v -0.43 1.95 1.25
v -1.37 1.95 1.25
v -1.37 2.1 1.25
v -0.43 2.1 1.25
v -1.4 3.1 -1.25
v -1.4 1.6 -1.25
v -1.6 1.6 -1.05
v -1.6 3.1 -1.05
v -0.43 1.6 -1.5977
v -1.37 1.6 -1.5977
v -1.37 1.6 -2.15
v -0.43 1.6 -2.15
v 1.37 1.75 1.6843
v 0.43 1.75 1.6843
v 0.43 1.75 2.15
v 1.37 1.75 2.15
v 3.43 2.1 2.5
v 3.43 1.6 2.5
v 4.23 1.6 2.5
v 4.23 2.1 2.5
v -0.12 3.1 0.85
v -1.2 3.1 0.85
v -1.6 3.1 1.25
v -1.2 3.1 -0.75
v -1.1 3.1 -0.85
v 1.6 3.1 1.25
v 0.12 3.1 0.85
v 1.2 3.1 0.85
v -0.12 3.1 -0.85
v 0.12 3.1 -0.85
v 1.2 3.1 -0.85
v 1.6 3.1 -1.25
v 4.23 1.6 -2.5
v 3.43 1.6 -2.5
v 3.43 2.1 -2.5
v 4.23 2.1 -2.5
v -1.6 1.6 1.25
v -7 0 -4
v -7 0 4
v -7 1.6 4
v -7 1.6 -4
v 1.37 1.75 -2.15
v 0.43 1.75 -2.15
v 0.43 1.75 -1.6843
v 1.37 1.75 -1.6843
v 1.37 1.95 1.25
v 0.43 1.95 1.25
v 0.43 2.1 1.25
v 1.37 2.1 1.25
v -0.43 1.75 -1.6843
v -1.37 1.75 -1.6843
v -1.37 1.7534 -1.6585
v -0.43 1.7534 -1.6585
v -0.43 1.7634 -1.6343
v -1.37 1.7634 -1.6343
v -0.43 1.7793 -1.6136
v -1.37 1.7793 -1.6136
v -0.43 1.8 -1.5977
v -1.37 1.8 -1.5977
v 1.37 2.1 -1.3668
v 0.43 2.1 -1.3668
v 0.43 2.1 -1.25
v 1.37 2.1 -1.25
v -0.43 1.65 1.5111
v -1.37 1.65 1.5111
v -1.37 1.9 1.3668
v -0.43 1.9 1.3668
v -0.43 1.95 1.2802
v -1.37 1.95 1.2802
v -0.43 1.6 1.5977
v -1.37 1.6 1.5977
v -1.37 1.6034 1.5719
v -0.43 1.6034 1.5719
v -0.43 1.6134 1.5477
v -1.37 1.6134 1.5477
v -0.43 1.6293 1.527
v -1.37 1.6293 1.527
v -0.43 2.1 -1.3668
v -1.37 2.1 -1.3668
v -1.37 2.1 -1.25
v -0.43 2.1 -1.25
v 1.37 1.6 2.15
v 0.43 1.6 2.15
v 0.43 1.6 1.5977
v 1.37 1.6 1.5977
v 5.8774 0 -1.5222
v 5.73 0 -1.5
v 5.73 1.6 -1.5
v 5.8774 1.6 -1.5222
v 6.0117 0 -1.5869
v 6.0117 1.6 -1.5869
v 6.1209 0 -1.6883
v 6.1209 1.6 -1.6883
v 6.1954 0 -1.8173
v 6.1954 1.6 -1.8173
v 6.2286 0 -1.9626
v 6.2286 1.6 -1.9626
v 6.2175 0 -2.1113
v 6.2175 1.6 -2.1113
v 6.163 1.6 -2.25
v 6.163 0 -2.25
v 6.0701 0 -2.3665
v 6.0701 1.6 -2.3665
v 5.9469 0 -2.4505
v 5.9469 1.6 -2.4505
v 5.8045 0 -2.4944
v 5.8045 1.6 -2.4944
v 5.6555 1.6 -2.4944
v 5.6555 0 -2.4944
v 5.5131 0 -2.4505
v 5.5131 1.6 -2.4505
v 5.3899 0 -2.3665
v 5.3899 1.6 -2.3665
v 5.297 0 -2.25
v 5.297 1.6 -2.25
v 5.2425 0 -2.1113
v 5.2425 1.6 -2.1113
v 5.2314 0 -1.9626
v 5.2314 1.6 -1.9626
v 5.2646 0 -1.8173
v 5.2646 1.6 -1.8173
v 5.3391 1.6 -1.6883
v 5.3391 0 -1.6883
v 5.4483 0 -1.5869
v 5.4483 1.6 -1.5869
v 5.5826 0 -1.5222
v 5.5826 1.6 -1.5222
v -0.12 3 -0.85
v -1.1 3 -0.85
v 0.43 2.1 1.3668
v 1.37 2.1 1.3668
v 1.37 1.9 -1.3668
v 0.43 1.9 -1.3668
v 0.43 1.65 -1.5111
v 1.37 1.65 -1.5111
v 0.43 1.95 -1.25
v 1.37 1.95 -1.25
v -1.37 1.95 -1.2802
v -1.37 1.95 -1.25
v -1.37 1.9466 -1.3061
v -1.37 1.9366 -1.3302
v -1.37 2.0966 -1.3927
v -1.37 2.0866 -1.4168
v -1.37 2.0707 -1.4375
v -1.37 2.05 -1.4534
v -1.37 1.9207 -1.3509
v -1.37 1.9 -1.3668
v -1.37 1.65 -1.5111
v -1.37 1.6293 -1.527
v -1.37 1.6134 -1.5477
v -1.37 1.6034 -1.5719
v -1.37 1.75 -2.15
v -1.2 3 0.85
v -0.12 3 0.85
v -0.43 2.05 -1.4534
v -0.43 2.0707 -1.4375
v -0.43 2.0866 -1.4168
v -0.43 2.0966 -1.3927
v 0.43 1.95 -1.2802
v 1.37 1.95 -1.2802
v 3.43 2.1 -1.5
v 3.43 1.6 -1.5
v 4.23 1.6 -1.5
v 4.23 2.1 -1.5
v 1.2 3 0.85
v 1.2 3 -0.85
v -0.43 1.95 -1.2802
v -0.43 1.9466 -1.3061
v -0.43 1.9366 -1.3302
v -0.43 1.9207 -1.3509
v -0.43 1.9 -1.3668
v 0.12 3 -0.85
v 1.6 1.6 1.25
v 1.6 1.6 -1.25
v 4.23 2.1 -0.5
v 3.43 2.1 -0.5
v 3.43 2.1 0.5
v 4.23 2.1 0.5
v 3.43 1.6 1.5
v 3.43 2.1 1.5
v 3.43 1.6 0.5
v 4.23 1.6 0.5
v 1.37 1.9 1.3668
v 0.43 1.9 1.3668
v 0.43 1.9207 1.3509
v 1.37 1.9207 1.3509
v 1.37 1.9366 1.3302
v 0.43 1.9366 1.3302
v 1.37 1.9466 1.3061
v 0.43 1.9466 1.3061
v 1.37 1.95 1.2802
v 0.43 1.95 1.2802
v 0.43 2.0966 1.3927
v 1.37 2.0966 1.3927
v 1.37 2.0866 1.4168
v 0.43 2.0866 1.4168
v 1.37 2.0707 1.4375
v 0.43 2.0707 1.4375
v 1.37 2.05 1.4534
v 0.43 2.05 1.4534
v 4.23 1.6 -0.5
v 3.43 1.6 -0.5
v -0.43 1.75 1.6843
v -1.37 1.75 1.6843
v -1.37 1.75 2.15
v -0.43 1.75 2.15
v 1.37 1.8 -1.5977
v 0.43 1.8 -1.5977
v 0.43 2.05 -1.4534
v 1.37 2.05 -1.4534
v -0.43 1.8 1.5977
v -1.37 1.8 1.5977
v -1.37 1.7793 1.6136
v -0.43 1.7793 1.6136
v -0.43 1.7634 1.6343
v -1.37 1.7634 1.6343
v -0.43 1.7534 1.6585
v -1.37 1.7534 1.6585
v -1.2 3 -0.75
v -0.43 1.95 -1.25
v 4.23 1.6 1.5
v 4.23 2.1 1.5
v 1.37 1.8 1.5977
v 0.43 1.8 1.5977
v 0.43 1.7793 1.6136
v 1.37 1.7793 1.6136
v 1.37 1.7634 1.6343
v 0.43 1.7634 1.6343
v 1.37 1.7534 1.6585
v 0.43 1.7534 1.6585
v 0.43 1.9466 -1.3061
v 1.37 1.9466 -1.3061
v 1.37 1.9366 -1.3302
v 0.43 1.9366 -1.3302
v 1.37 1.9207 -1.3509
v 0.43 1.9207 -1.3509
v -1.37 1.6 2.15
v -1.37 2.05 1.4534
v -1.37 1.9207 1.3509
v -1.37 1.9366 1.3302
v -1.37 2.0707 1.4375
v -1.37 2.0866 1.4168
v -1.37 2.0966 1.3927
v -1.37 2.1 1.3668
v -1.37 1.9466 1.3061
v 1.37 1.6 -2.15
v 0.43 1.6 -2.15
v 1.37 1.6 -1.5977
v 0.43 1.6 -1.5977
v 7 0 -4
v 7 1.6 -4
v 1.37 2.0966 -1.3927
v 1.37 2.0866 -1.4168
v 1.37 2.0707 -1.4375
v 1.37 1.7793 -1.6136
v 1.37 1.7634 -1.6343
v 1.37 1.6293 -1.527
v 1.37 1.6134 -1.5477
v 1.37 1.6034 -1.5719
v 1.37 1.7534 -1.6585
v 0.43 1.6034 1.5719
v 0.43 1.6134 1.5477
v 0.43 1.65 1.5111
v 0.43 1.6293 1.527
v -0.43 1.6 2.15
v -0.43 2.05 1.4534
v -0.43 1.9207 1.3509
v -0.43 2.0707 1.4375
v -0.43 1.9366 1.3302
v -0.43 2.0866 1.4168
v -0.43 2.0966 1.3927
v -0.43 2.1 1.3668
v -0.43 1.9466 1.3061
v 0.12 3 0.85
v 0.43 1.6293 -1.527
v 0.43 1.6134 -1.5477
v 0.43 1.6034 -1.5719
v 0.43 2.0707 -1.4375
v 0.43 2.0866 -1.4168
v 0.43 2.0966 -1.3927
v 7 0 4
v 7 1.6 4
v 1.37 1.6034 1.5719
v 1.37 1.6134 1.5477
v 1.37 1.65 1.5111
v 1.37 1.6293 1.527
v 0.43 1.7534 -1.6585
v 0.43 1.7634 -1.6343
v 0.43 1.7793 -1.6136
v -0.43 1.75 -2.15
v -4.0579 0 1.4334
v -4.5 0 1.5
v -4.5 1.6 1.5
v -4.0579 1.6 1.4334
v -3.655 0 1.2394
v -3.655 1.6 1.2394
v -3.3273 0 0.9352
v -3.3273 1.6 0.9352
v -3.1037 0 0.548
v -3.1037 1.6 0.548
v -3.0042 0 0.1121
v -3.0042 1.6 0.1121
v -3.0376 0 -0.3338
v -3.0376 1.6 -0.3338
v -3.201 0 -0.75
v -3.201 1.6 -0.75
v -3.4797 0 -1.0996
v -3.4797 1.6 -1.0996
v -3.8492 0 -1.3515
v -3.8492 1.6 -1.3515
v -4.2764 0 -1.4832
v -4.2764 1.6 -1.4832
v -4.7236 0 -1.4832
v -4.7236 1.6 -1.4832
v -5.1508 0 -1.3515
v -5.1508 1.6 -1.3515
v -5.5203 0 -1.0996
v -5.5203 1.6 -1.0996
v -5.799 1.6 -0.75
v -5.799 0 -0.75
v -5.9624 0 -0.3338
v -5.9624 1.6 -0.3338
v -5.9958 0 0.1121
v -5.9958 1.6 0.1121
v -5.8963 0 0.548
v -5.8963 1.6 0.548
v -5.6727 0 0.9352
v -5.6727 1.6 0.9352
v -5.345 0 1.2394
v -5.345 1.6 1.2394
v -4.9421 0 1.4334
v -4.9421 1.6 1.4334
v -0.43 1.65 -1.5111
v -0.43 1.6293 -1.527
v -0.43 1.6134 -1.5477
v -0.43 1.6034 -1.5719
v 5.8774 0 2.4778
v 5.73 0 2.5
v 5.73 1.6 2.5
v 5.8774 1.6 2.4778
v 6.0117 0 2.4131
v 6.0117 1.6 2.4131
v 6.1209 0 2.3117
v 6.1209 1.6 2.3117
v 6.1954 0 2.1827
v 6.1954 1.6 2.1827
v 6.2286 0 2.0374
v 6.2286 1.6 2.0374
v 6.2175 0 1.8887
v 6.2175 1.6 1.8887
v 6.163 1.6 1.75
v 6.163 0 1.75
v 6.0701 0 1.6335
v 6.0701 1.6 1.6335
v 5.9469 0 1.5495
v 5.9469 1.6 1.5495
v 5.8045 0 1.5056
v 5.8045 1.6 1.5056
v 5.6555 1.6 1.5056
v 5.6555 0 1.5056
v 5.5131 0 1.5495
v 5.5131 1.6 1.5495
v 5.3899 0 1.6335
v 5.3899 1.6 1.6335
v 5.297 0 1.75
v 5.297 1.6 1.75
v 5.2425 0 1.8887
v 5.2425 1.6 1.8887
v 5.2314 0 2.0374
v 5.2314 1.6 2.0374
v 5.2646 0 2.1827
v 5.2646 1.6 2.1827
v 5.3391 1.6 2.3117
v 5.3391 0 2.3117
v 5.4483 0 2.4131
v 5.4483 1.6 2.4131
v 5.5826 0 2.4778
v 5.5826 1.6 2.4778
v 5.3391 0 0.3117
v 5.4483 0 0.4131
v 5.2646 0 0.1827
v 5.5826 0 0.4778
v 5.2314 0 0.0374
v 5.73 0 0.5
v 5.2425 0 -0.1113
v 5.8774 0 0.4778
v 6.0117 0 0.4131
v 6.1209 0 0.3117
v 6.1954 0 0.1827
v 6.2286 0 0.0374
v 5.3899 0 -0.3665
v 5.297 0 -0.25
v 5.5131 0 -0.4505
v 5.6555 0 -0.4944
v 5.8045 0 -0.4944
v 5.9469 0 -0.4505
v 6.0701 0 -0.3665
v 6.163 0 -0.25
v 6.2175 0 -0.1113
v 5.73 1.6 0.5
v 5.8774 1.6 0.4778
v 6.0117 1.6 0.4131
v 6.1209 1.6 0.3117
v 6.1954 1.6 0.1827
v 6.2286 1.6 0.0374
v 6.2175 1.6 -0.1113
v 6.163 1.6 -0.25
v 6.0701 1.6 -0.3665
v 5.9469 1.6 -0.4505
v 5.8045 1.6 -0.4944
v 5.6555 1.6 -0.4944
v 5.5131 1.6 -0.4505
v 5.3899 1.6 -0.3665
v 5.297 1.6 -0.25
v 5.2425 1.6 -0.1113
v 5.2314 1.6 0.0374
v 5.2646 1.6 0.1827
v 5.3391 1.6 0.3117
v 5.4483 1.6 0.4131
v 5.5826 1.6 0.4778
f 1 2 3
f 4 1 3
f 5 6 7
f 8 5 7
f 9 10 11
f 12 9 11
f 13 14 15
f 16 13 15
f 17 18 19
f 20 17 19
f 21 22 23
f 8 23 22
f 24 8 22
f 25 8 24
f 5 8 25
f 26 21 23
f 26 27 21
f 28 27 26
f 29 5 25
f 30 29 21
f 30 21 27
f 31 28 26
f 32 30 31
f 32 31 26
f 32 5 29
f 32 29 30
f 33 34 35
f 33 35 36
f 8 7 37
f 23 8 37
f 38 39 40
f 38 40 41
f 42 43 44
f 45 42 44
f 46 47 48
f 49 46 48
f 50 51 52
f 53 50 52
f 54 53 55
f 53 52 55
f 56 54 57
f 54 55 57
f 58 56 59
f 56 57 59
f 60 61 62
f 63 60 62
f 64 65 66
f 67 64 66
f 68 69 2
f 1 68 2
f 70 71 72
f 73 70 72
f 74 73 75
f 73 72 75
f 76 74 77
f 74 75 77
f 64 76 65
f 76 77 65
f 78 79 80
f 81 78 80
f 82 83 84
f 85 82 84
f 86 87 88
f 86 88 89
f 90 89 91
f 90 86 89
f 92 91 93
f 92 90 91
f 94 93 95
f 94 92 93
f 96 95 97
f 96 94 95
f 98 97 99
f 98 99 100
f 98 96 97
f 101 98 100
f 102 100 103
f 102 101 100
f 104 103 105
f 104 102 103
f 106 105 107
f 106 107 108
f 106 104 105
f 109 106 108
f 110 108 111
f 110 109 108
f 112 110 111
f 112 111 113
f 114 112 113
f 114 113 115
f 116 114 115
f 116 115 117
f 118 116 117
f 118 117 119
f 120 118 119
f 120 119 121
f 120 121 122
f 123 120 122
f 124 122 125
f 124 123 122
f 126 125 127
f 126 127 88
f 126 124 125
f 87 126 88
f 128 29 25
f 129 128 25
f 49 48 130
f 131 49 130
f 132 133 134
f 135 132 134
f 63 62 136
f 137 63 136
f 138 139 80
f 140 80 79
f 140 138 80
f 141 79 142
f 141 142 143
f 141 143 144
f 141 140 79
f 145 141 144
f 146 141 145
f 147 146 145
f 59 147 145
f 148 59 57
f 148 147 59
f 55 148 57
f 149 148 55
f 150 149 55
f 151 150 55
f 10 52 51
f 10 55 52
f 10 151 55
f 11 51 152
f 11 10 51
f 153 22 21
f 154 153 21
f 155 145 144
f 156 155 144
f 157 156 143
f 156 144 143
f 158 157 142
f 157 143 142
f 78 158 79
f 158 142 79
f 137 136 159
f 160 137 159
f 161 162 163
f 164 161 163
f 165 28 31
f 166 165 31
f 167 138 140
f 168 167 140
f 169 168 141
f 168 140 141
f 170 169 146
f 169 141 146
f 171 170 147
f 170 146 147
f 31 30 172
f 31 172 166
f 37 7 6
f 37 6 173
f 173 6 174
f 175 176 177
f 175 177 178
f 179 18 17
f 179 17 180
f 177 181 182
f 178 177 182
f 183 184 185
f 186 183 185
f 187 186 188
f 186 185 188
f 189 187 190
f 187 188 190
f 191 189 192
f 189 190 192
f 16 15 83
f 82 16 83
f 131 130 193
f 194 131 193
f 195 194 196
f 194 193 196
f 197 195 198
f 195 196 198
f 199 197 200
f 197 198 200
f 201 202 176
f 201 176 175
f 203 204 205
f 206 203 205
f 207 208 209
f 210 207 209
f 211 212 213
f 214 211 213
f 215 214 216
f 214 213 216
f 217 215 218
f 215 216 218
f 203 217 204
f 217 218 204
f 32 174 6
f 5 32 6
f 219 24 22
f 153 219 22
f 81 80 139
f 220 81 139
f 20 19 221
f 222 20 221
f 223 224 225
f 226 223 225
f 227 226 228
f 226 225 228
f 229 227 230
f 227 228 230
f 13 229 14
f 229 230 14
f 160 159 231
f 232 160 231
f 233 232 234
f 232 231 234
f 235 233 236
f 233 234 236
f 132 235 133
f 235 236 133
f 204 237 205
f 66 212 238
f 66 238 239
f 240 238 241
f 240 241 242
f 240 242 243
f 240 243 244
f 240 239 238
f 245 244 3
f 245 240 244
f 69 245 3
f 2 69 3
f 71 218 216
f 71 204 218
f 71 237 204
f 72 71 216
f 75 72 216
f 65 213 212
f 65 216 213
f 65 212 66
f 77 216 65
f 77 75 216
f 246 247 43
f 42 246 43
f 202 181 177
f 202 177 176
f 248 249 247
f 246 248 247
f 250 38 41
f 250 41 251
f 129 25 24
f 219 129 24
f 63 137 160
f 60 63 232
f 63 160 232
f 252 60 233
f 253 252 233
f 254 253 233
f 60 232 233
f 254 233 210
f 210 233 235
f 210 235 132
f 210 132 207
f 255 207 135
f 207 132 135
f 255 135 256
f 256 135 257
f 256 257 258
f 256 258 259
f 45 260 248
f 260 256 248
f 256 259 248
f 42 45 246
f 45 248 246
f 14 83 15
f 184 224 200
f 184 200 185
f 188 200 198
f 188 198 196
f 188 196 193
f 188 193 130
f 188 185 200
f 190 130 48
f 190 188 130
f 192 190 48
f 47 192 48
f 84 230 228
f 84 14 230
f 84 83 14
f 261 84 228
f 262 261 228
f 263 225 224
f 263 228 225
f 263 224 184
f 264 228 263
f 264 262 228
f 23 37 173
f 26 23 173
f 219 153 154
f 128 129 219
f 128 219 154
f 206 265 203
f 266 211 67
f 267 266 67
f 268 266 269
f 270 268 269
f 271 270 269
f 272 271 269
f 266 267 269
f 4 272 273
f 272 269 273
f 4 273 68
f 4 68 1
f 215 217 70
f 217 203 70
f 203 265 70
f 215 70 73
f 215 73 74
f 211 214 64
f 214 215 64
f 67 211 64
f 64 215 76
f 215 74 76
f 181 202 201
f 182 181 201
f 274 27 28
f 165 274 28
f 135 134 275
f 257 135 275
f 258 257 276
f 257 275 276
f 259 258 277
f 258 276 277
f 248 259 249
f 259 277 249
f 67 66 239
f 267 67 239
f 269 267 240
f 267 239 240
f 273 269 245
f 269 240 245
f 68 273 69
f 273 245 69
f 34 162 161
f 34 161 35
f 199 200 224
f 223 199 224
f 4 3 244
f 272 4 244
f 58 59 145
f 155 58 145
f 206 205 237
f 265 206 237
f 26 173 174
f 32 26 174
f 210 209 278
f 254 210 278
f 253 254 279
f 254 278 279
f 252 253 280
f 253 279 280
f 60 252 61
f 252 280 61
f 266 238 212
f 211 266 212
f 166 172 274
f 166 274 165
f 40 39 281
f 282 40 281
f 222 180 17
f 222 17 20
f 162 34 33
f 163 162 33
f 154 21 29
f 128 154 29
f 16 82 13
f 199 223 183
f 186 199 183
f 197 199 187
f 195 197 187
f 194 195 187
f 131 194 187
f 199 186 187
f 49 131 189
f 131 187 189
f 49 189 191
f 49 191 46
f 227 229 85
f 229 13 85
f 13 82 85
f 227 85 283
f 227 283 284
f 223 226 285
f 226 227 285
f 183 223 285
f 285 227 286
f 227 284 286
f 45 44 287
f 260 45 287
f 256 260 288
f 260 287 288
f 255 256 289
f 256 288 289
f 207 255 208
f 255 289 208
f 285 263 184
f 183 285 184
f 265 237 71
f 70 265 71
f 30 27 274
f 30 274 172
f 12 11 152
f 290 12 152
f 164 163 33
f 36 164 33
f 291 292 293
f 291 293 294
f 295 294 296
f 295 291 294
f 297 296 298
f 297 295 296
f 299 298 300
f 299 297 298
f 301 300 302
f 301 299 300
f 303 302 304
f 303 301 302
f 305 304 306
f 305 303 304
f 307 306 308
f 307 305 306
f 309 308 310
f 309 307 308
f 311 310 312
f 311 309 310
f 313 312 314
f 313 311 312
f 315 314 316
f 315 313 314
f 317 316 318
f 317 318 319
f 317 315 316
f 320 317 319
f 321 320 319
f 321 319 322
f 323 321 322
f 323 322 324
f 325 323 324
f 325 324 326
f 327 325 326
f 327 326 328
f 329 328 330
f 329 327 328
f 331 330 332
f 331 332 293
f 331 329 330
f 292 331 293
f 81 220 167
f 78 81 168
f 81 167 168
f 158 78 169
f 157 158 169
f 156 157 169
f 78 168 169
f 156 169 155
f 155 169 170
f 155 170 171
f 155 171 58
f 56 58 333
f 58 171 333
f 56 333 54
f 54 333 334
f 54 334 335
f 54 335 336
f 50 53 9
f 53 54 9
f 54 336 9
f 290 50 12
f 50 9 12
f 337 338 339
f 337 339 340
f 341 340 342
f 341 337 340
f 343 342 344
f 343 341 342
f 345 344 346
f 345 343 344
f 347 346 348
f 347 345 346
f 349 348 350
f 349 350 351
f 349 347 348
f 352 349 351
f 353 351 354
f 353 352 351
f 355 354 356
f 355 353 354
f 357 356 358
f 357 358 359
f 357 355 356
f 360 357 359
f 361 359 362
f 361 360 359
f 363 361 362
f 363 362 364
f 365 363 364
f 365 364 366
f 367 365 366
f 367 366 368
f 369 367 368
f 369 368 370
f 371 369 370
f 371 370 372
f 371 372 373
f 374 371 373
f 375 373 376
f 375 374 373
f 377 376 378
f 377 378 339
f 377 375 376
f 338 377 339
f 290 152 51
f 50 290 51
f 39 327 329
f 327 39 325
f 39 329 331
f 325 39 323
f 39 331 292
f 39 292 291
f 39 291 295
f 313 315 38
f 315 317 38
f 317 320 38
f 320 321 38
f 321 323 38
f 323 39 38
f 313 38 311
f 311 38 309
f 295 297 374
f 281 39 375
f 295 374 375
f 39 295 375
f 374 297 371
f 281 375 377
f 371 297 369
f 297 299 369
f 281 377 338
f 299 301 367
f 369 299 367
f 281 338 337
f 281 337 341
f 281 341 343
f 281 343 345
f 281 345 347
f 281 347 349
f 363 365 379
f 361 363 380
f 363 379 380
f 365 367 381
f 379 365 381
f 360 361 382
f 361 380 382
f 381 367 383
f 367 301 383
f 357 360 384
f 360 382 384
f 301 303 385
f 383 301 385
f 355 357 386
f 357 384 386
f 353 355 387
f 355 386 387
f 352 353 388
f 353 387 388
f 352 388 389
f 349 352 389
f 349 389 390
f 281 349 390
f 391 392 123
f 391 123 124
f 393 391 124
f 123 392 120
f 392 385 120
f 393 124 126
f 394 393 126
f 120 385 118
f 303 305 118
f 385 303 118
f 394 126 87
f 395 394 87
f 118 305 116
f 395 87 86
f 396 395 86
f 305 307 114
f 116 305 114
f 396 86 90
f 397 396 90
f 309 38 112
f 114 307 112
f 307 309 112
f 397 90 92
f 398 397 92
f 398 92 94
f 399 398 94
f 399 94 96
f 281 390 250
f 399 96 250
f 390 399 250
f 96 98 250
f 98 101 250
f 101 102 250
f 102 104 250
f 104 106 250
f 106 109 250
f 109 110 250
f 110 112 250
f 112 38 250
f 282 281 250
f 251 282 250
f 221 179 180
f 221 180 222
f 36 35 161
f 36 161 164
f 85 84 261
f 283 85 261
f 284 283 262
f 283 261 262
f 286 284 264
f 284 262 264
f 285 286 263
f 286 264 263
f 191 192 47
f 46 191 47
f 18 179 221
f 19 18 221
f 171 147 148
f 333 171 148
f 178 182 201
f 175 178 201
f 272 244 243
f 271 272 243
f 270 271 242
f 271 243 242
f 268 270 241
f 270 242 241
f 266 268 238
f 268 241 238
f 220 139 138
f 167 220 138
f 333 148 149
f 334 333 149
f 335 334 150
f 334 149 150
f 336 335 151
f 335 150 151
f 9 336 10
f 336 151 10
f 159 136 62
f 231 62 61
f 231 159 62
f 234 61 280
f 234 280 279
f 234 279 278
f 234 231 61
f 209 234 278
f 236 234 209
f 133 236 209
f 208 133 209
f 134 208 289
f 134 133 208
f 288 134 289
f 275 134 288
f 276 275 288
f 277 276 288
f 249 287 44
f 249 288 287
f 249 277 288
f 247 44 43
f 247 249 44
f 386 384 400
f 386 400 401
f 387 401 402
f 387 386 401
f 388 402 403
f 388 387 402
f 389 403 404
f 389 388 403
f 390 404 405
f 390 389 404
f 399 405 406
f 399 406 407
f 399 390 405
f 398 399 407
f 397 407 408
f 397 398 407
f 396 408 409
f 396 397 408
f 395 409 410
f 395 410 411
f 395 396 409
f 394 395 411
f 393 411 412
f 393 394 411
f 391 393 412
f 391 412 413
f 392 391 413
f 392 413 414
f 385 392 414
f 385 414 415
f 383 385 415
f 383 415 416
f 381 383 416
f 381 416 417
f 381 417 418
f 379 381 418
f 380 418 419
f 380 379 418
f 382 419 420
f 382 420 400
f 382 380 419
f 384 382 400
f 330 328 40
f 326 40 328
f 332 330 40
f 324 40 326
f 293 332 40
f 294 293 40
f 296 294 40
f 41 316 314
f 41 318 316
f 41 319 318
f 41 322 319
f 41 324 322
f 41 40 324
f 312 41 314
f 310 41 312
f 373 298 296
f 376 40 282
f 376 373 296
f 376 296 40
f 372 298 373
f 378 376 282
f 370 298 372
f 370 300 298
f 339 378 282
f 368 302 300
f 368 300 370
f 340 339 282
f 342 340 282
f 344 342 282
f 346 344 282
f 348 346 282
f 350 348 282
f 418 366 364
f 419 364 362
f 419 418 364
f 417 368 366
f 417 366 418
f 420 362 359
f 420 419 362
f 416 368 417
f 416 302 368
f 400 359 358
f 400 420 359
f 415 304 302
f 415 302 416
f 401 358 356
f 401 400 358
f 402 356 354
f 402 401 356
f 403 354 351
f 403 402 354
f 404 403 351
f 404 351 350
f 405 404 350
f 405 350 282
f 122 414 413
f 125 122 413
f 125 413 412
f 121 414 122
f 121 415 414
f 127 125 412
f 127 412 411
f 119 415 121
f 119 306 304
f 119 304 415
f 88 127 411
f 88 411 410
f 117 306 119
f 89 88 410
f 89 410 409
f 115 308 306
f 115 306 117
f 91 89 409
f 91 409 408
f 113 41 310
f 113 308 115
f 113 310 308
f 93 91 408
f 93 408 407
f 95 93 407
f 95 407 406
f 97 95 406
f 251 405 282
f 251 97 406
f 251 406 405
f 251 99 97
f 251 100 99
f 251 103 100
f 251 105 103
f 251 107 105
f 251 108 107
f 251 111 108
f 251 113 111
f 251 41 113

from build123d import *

# Parameters (mm, degrees)
SKETCH1_W             = 14
SKETCH1_H             = 8
SKETCH1_R             = 1.5
SKETCH1_R_2           = 0.5
BOSS_EXTRUDE1_DEPTH   = 1.6
SKETCH2_W             = 0.8
SKETCH2_H             = 1
BOSS_EXTRUDE2_DEPTH   = 0.5
BOSS_EXTRUDE2_2_DEPTH = 0.5
BOSS_EXTRUDE2_3_DEPTH = 0.5
BOSS_EXTRUDE3_DEPTH   = 1.5
SKETCH4_W             = 1.08
SKETCH4_H             = 1.7
CUT_EXTRUDE1_DEPTH    = 0.1
BOSS_EXTRUDE4_DEPTH   = 3.2
BOSS_EXTRUDE4_2_DEPTH = 3.2
CUT_EXTRUDE2_START    = -3.1
SKETCH6_W             = 0.23
SKETCH6_H             = 0.9
SKETCH6_W_2           = 0.86
CUT_EXTRUDE2_DEPTH    = 3.1


with BuildPart() as part:
    # Sketch1 → Boss-Extrude1 (new body)
    with BuildSketch(Plane(origin=(0, 0, 0), x_dir=(1, 0, 0), z_dir=(0, 1, 0))):
        Rectangle(SKETCH1_W, SKETCH1_H)
        with Locations(Location((-4.5, 0, 0), (0, 0, 270))):
            Circle(SKETCH1_R, mode=Mode.SUBTRACT)
        with Locations(Location((5.73, 2, 0), (0, 0, 270))):
            Circle(SKETCH1_R_2, mode=Mode.SUBTRACT)
        with Locations(Location((5.73, -2, 0), (0, 0, 270))):
            Circle(SKETCH1_R_2, mode=Mode.SUBTRACT)
        with Locations(Location((5.73, 0, 0), (0, 0, 270))):
            Circle(SKETCH1_R_2, mode=Mode.SUBTRACT)
    extrude(amount=BOSS_EXTRUDE1_DEPTH)


with BuildPart() as body_2:
    # Sketch2 → Boss-Extrude2 (new body)
    with BuildSketch(Plane(origin=(0, 1.6, 0), x_dir=(1, 0, 0), z_dir=(0, 1, 0))):
        with Locations((3.83, 2)):
            Rectangle(SKETCH2_W, SKETCH2_H)
    extrude(amount=BOSS_EXTRUDE2_DEPTH)


with BuildPart() as body_3:
    # Sketch2 → Boss-Extrude2 2 (new body)
    with BuildSketch(Plane(origin=(0, 1.6, 0), x_dir=(1, 0, 0), z_dir=(0, 1, 0))):
        with Locations((3.83, 0)):
            Rectangle(SKETCH2_W, SKETCH2_H)
    extrude(amount=BOSS_EXTRUDE2_2_DEPTH)


with BuildPart() as body_4:
    # Sketch2 → Boss-Extrude2 3 (new body)
    with BuildSketch(Plane(origin=(0, 1.6, 0), x_dir=(1, 0, 0), z_dir=(0, 1, 0))):
        with Locations((3.83, -2)):
            Rectangle(SKETCH2_W, SKETCH2_H)
    extrude(amount=BOSS_EXTRUDE2_3_DEPTH)


with BuildPart() as body_5:
    # Sketch3 → Boss-Extrude3 (new body)
    with BuildSketch(Plane(origin=(0, 1.6, 0), x_dir=(1, 0, 0), z_dir=(0, 1, 0))):
        Polygon((1.6, 1.25), (-1.4, 1.25), (-1.6, 1.05), (-1.6, -1.25), (1.6, -1.25), align=None)
    extrude(amount=BOSS_EXTRUDE3_DEPTH)

    # Sketch4 → Cut-Extrude1 (cut)
    with BuildSketch(Plane(origin=(0, 3.1, 0), x_dir=(1, 0, 0), z_dir=(0, 1, 0))):
        with Locations((0.66, 0)):
            Rectangle(SKETCH4_W, SKETCH4_H)
        Polygon((-0.12, 0.85), (-1.1, 0.85), (-1.2, 0.75), (-1.2, -0.85), (-0.12, -0.85), align=None)
    extrude(amount=-CUT_EXTRUDE1_DEPTH, mode=Mode.SUBTRACT)


with BuildPart() as body_6:
    # Sketch5 → Boss-Extrude4 (new body)
    with BuildSketch(Plane.ZY.offset(1.6)):
        with BuildLine():
            Line((1.25, 2.1), (1.366794919, 2.1))
            ThreePointArc((1.366794919, 2.1), (1.416794919, 2.08660254), (1.45339746, 2.05))
            Line((1.45339746, 2.05), (1.597735027, 1.8))
            ThreePointArc((1.597735027, 1.8), (1.634337567, 1.76339746), (1.684337567, 1.75))
            Line((1.684337567, 1.75), (2.15, 1.75))
            Line((2.15, 1.75), (2.15, 1.6))
            Line((2.15, 1.6), (1.597735027, 1.6))
            ThreePointArc((1.597735027, 1.6), (1.547735027, 1.61339746), (1.511132487, 1.65))
            Line((1.511132487, 1.65), (1.366794919, 1.9))
            ThreePointArc((1.366794919, 1.9), (1.330192379, 1.93660254), (1.280192379, 1.95))
            Line((1.280192379, 1.95), (1.25, 1.95))
            Line((1.25, 1.95), (1.25, 2.1))
        make_face()
    extrude(amount=-BOSS_EXTRUDE4_DEPTH)


with BuildPart() as body_7:
    # Sketch5 → Boss-Extrude4 2 (new body)
    with BuildSketch(Plane.ZY.offset(1.6)):
        with BuildLine():
            Line((-1.25, 2.1), (-1.25, 1.95))
            Line((-1.25, 1.95), (-1.280192379, 1.95))
            ThreePointArc((-1.280192379, 1.95), (-1.330192379, 1.93660254), (-1.366794919, 1.9))
            Line((-1.366794919, 1.9), (-1.511132487, 1.65))
            ThreePointArc((-1.511132487, 1.65), (-1.547735027, 1.61339746), (-1.597735027, 1.6))
            Line((-1.597735027, 1.6), (-2.15, 1.6))
            Line((-2.15, 1.6), (-2.15, 1.75))
            Line((-2.15, 1.75), (-1.684337567, 1.75))
            ThreePointArc((-1.684337567, 1.75), (-1.634337567, 1.76339746), (-1.597735027, 1.8))
            Line((-1.597735027, 1.8), (-1.45339746, 2.05))
            ThreePointArc((-1.45339746, 2.05), (-1.416794919, 2.08660254), (-1.366794919, 2.1))
            Line((-1.366794919, 2.1), (-1.25, 2.1))
        make_face()
    extrude(amount=-BOSS_EXTRUDE4_2_DEPTH)


with BuildPart() as cut_extrude2_tool:
    # Sketch6 → Cut-Extrude2 (new body)
    with BuildSketch(Plane(origin=(0, 3.1, 0), x_dir=(1, 0, 0), z_dir=(0, 1, 0)).offset(CUT_EXTRUDE2_START)):
        with Locations((1.485, 1.7)):
            Rectangle(SKETCH6_W, SKETCH6_H)
        with Locations((0, 1.7)):
            Rectangle(SKETCH6_W_2, SKETCH6_H)
        with Locations((-1.485, 1.7)):
            Rectangle(SKETCH6_W, SKETCH6_H)
        with Locations((-1.485, -1.7)):
            Rectangle(SKETCH6_W, SKETCH6_H)
        with Locations((0, -1.7)):
            Rectangle(SKETCH6_W_2, SKETCH6_H)
        with Locations((1.485, -1.7)):
            Rectangle(SKETCH6_W, SKETCH6_H)
    extrude(amount=CUT_EXTRUDE2_DEPTH)


with BuildPart() as body_7_1:
    add(body_7.part)

    # Cut-Extrude2: cut by cut_extrude2_tool
    add(cut_extrude2_tool.part, mode=Mode.SUBTRACT)


with BuildPart() as body_6_1:
    add(body_6.part)

    # Cut-Extrude2: cut by cut_extrude2_tool
    add(cut_extrude2_tool.part, mode=Mode.SUBTRACT)


with BuildPart() as cut_extrude2_piece_1:
    # of the separate pieces the step leaves, piece 1, a body of its own (cut_extrude2_pieces)
    add(body_6_1.part.solids().sort_by_distance((-1.37, 2.1, 1.25))[0])


with BuildPart() as cut_extrude2_piece_2:
    # of the separate pieces the step leaves, piece 2, a body of its own (cut_extrude2_pieces)
    add(body_6_1.part.solids().sort_by_distance((0.43, 2.1, 1.25))[0])


with BuildPart() as cut_extrude2_piece_1_of_body_7:
    # of the separate pieces the step leaves, piece 1, a body of its own (cut_extrude2_pieces_of_body_7)
    add(body_7_1.part.solids().sort_by_distance((-1.37, 1.95, -1.25))[0])


with BuildPart() as cut_extrude2_piece_2_of_body_7:
    # of the separate pieces the step leaves, piece 2, a body of its own (cut_extrude2_pieces_of_body_7)
    add(body_7_1.part.solids().sort_by_distance((0.43, 1.95, -1.25))[0])


solid = Compound([part.part, body_2.part, body_3.part, body_4.part, body_5.part, cut_extrude2_piece_1.part, cut_extrude2_piece_2.part, cut_extrude2_piece_1_of_body_7.part, cut_extrude2_piece_2_of_body_7.part])
